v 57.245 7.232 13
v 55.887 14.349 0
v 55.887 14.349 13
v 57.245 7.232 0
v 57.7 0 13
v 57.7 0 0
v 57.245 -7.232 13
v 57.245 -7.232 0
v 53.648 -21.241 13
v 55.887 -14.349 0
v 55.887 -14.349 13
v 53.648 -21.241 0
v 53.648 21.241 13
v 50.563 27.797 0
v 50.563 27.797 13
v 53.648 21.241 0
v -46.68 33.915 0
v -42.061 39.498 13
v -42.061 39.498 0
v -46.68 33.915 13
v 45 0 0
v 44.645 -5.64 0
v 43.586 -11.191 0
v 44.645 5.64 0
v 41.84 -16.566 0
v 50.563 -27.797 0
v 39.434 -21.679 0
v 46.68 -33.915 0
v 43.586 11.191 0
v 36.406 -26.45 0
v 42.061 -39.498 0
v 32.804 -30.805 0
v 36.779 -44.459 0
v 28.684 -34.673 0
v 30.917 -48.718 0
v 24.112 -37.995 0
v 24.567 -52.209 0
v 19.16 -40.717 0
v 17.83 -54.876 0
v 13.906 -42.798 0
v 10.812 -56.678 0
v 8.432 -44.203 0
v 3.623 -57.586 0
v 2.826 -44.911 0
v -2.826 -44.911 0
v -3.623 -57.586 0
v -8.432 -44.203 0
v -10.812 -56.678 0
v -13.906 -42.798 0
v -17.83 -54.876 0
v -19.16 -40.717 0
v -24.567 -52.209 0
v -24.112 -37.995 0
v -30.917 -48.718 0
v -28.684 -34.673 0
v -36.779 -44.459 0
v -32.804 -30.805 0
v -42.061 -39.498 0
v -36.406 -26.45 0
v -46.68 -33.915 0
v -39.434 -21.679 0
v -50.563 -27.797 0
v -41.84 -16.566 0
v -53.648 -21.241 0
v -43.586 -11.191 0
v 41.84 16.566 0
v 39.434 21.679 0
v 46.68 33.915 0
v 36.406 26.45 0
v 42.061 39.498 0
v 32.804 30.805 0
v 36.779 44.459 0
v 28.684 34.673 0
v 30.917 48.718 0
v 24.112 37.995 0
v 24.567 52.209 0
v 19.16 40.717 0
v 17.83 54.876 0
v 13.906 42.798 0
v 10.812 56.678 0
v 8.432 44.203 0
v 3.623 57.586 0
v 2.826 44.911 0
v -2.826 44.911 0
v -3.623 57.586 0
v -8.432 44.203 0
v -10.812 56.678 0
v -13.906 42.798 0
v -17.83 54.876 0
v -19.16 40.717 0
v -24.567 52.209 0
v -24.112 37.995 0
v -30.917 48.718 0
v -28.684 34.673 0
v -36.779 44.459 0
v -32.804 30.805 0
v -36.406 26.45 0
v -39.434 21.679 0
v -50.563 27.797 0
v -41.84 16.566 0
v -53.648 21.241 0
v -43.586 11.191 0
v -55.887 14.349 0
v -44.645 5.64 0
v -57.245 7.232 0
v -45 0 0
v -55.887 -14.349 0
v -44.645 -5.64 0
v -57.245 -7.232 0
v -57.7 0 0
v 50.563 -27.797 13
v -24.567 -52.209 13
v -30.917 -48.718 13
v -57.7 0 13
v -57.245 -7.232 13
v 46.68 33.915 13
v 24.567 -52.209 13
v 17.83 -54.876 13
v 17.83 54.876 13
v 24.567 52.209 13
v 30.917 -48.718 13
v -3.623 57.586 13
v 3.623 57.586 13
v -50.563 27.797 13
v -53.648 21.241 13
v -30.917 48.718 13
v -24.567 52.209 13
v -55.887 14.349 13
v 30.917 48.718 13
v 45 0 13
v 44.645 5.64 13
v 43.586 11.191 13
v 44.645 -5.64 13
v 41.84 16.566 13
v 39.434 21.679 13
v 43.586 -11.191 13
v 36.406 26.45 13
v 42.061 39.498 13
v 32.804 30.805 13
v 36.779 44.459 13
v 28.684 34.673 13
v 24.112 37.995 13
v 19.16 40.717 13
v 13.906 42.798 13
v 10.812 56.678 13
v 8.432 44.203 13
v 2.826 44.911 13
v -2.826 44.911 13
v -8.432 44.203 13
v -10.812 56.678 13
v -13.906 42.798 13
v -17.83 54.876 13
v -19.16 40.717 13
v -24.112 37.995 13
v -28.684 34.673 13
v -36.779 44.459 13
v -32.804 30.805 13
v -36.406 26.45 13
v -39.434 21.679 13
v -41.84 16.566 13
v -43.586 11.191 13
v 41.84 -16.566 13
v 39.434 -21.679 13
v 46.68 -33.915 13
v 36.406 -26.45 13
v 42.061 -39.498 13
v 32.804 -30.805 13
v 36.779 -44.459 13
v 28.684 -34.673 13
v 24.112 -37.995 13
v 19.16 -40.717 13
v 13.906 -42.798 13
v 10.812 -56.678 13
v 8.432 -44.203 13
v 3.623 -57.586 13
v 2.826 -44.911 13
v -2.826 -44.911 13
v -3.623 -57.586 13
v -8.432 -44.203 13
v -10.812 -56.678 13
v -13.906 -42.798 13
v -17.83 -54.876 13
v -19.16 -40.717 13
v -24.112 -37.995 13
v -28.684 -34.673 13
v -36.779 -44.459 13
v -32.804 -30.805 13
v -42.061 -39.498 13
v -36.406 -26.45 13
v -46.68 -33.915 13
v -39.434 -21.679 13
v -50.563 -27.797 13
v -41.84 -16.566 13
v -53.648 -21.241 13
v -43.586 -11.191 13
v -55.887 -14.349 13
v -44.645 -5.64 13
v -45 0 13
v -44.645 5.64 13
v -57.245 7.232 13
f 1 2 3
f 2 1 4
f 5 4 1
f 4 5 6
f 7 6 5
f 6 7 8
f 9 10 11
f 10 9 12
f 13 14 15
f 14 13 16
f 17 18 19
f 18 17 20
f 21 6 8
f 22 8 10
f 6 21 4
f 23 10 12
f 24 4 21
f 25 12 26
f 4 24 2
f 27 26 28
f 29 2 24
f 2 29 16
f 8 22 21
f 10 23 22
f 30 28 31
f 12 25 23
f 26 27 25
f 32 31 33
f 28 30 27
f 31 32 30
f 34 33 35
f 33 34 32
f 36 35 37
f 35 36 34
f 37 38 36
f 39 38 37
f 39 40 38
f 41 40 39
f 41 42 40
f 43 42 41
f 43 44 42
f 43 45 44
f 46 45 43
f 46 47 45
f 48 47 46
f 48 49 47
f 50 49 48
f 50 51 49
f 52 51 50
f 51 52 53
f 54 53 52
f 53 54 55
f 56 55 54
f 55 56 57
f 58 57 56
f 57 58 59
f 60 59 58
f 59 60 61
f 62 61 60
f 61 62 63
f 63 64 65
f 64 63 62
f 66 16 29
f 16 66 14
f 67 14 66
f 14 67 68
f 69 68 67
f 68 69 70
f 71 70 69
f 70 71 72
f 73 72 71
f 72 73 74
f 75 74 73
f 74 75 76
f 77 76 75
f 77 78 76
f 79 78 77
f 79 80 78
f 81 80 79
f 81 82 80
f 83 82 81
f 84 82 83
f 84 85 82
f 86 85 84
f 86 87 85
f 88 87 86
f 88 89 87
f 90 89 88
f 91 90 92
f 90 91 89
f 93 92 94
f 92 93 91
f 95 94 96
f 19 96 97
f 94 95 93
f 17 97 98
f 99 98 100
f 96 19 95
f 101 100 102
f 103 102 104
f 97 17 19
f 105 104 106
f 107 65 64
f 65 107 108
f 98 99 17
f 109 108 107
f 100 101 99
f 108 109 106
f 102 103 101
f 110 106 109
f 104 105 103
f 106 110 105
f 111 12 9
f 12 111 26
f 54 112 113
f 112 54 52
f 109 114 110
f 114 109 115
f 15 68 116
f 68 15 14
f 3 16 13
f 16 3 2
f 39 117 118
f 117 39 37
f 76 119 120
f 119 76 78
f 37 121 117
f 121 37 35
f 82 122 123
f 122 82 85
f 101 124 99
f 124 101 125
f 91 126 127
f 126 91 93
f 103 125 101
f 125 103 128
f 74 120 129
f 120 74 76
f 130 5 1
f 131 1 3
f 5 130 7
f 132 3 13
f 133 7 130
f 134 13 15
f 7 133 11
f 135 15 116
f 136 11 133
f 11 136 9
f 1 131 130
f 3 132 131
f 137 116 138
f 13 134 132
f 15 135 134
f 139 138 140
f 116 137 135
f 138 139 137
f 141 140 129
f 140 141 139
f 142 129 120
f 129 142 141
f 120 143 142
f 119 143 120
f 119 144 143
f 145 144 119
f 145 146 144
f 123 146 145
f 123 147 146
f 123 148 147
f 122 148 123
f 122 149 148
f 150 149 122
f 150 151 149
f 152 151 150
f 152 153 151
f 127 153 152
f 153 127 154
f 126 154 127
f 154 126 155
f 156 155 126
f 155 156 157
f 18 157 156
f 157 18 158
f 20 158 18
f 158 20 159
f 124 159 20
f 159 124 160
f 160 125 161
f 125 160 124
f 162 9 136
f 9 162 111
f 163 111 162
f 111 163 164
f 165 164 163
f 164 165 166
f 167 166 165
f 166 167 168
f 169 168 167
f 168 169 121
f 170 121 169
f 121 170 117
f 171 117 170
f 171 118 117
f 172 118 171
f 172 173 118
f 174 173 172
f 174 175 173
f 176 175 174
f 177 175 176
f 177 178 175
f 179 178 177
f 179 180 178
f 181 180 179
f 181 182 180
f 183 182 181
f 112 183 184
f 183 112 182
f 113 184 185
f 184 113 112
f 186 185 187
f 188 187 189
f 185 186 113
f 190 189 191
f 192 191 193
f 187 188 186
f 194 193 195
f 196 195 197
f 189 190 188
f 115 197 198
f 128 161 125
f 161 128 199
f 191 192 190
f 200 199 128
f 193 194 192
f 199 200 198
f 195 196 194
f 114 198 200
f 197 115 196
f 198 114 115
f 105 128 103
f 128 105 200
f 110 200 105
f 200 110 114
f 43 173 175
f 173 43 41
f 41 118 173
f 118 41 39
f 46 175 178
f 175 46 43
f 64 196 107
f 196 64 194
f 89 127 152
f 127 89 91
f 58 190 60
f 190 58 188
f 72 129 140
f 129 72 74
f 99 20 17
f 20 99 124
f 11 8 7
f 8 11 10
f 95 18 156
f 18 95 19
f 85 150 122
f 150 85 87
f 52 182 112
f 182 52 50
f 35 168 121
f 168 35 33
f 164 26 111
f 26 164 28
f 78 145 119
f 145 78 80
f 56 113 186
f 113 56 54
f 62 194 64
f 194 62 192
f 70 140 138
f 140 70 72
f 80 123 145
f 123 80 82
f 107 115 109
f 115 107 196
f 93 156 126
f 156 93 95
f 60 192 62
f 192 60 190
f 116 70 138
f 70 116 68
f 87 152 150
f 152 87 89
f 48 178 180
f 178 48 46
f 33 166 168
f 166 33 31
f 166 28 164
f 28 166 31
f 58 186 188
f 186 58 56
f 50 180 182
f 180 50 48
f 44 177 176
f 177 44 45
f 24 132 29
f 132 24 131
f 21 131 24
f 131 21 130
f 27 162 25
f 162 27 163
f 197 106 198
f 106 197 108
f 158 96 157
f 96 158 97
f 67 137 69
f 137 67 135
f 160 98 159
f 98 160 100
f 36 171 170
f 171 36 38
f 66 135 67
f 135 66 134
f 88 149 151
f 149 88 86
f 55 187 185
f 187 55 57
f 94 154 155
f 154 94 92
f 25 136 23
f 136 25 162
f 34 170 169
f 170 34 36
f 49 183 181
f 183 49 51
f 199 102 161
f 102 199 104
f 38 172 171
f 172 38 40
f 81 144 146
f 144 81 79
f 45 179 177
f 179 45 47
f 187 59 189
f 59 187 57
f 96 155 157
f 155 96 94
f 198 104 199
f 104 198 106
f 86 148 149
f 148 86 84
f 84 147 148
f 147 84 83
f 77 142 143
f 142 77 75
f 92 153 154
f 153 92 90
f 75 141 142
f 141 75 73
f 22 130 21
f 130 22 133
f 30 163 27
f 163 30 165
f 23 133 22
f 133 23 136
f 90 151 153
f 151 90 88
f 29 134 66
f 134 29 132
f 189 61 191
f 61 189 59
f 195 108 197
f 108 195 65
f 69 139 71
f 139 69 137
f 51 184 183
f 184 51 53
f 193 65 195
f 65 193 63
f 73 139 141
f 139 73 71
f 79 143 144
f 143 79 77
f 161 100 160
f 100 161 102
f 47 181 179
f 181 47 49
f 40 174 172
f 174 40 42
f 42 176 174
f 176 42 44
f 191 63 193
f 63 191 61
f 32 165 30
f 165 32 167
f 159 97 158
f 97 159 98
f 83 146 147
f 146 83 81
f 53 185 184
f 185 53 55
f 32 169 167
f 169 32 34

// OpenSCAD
$fn = 50;


difference() {
	union() {
		cylinder(h = 13, r = 57.7000000000);
	}
	union() {
		cylinder(h = 13, r = 45.0000000000);
	}
}
